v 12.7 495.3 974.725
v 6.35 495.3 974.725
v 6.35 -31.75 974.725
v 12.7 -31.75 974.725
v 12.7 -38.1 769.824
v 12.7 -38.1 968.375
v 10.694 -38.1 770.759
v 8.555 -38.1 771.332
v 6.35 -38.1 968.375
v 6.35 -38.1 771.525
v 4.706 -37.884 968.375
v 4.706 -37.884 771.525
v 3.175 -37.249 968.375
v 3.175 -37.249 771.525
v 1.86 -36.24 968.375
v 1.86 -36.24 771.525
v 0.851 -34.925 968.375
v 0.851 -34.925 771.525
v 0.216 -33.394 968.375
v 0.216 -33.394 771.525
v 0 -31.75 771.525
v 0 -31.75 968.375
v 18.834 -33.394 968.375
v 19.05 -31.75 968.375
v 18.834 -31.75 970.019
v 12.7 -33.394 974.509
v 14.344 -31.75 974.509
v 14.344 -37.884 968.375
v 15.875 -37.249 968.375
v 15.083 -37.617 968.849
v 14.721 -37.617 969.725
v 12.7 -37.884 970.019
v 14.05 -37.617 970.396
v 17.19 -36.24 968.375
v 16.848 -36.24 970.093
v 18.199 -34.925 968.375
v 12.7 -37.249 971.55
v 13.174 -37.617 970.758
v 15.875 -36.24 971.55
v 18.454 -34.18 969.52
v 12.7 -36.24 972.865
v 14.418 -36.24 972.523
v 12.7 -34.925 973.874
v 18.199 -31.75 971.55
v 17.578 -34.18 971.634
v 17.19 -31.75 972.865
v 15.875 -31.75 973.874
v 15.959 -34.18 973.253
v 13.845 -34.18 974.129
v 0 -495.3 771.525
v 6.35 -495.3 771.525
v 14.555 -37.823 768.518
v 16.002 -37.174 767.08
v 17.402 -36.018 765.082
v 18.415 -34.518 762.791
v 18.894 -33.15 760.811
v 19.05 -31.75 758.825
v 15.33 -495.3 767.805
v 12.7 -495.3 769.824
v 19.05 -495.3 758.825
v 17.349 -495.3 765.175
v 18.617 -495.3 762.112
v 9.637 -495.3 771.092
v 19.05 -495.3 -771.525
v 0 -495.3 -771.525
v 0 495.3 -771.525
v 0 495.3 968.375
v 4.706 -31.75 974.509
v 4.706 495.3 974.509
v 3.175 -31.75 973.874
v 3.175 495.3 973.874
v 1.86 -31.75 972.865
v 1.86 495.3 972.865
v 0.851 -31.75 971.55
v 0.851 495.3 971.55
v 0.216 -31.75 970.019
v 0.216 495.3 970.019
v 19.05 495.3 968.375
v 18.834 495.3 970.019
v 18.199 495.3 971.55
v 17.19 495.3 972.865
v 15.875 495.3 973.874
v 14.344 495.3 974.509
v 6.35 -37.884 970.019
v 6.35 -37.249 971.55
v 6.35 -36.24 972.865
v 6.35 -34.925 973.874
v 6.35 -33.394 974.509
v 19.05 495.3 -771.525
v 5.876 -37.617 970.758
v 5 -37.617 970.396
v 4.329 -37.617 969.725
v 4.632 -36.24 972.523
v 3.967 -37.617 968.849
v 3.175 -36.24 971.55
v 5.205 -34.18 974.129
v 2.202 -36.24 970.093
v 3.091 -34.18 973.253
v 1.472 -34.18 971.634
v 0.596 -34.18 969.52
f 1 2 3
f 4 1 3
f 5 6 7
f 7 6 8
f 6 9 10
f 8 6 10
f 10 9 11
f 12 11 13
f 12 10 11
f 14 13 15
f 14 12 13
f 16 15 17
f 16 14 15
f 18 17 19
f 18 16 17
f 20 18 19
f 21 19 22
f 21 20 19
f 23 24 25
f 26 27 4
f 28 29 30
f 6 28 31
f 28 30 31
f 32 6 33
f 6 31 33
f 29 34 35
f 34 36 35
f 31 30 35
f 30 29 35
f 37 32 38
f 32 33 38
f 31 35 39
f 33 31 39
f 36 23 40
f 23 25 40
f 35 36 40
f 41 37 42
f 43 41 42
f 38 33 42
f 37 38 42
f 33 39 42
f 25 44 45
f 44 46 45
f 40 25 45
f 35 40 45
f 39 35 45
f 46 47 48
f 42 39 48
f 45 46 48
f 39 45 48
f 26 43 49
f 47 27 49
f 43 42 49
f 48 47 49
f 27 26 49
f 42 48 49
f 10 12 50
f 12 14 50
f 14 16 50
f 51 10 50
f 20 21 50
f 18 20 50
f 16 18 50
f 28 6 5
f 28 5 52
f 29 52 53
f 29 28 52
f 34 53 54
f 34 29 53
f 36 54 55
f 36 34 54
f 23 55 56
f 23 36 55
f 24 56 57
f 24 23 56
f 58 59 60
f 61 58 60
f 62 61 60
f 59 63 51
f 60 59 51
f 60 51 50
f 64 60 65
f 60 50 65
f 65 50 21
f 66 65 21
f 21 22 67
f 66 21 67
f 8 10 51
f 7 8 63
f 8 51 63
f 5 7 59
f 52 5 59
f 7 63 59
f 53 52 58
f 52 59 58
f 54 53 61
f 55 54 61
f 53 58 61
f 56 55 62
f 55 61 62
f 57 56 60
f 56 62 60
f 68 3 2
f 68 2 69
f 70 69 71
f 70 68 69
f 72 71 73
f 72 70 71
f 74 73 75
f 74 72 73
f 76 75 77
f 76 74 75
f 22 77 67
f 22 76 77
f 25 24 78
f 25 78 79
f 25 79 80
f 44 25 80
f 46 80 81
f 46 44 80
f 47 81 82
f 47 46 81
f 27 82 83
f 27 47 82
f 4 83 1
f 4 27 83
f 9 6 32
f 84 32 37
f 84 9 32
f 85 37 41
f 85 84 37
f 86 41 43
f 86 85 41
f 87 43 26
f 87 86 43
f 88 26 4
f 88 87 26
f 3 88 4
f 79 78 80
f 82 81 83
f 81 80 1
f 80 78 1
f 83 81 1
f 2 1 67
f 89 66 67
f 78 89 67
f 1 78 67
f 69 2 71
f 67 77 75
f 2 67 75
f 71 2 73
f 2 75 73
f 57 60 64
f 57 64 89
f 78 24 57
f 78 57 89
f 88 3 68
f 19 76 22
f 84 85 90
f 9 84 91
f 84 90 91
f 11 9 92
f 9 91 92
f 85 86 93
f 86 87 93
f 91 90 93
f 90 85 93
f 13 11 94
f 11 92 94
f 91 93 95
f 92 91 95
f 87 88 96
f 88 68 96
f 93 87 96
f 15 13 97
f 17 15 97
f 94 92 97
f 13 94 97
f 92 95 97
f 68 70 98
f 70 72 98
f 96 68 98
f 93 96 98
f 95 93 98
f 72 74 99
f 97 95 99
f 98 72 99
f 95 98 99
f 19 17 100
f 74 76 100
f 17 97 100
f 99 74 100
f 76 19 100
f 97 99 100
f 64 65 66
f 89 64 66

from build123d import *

# Parameters (mm, degrees)
F1_DEPTH = 19.05
F2_R     = 12.7
F3_R     = 6.35
F4_R     = 6.35


with BuildPart() as f1:
    # F0 (on Right) → F1 (new body)
    with BuildSketch(Plane.YZ):
        Polygon((-495.3, -771.525), (495.3, -771.525), (495.3, 771.525), (495.3, 974.725), (-38.1, 974.725), (-38.1, 771.525), (-495.3, 771.525), align=None)
    extrude(amount=F1_DEPTH)

    # F2
    f2_edges = [f1.edges().sort_by_distance(p)[0] for p in [
        (19.05, -266.7, 771.525),
    ]]
    fillet(f2_edges, radius=F2_R)

    # F3
    f3_edges = [f1.edges().sort_by_distance(p)[0] for p in [
        (19.05, 228.6, 974.725),
        (0, 228.6, 974.725),
    ]]
    fillet(f3_edges, radius=F3_R)

    # F4
    f4_edges = [f1.edges().sort_by_distance(p)[0] for p in [
        (19.05, -38.1, 869.95),
        (0, -38.1, 869.95),
    ]]
    fillet(f4_edges, radius=F4_R)


solid = f1.part
